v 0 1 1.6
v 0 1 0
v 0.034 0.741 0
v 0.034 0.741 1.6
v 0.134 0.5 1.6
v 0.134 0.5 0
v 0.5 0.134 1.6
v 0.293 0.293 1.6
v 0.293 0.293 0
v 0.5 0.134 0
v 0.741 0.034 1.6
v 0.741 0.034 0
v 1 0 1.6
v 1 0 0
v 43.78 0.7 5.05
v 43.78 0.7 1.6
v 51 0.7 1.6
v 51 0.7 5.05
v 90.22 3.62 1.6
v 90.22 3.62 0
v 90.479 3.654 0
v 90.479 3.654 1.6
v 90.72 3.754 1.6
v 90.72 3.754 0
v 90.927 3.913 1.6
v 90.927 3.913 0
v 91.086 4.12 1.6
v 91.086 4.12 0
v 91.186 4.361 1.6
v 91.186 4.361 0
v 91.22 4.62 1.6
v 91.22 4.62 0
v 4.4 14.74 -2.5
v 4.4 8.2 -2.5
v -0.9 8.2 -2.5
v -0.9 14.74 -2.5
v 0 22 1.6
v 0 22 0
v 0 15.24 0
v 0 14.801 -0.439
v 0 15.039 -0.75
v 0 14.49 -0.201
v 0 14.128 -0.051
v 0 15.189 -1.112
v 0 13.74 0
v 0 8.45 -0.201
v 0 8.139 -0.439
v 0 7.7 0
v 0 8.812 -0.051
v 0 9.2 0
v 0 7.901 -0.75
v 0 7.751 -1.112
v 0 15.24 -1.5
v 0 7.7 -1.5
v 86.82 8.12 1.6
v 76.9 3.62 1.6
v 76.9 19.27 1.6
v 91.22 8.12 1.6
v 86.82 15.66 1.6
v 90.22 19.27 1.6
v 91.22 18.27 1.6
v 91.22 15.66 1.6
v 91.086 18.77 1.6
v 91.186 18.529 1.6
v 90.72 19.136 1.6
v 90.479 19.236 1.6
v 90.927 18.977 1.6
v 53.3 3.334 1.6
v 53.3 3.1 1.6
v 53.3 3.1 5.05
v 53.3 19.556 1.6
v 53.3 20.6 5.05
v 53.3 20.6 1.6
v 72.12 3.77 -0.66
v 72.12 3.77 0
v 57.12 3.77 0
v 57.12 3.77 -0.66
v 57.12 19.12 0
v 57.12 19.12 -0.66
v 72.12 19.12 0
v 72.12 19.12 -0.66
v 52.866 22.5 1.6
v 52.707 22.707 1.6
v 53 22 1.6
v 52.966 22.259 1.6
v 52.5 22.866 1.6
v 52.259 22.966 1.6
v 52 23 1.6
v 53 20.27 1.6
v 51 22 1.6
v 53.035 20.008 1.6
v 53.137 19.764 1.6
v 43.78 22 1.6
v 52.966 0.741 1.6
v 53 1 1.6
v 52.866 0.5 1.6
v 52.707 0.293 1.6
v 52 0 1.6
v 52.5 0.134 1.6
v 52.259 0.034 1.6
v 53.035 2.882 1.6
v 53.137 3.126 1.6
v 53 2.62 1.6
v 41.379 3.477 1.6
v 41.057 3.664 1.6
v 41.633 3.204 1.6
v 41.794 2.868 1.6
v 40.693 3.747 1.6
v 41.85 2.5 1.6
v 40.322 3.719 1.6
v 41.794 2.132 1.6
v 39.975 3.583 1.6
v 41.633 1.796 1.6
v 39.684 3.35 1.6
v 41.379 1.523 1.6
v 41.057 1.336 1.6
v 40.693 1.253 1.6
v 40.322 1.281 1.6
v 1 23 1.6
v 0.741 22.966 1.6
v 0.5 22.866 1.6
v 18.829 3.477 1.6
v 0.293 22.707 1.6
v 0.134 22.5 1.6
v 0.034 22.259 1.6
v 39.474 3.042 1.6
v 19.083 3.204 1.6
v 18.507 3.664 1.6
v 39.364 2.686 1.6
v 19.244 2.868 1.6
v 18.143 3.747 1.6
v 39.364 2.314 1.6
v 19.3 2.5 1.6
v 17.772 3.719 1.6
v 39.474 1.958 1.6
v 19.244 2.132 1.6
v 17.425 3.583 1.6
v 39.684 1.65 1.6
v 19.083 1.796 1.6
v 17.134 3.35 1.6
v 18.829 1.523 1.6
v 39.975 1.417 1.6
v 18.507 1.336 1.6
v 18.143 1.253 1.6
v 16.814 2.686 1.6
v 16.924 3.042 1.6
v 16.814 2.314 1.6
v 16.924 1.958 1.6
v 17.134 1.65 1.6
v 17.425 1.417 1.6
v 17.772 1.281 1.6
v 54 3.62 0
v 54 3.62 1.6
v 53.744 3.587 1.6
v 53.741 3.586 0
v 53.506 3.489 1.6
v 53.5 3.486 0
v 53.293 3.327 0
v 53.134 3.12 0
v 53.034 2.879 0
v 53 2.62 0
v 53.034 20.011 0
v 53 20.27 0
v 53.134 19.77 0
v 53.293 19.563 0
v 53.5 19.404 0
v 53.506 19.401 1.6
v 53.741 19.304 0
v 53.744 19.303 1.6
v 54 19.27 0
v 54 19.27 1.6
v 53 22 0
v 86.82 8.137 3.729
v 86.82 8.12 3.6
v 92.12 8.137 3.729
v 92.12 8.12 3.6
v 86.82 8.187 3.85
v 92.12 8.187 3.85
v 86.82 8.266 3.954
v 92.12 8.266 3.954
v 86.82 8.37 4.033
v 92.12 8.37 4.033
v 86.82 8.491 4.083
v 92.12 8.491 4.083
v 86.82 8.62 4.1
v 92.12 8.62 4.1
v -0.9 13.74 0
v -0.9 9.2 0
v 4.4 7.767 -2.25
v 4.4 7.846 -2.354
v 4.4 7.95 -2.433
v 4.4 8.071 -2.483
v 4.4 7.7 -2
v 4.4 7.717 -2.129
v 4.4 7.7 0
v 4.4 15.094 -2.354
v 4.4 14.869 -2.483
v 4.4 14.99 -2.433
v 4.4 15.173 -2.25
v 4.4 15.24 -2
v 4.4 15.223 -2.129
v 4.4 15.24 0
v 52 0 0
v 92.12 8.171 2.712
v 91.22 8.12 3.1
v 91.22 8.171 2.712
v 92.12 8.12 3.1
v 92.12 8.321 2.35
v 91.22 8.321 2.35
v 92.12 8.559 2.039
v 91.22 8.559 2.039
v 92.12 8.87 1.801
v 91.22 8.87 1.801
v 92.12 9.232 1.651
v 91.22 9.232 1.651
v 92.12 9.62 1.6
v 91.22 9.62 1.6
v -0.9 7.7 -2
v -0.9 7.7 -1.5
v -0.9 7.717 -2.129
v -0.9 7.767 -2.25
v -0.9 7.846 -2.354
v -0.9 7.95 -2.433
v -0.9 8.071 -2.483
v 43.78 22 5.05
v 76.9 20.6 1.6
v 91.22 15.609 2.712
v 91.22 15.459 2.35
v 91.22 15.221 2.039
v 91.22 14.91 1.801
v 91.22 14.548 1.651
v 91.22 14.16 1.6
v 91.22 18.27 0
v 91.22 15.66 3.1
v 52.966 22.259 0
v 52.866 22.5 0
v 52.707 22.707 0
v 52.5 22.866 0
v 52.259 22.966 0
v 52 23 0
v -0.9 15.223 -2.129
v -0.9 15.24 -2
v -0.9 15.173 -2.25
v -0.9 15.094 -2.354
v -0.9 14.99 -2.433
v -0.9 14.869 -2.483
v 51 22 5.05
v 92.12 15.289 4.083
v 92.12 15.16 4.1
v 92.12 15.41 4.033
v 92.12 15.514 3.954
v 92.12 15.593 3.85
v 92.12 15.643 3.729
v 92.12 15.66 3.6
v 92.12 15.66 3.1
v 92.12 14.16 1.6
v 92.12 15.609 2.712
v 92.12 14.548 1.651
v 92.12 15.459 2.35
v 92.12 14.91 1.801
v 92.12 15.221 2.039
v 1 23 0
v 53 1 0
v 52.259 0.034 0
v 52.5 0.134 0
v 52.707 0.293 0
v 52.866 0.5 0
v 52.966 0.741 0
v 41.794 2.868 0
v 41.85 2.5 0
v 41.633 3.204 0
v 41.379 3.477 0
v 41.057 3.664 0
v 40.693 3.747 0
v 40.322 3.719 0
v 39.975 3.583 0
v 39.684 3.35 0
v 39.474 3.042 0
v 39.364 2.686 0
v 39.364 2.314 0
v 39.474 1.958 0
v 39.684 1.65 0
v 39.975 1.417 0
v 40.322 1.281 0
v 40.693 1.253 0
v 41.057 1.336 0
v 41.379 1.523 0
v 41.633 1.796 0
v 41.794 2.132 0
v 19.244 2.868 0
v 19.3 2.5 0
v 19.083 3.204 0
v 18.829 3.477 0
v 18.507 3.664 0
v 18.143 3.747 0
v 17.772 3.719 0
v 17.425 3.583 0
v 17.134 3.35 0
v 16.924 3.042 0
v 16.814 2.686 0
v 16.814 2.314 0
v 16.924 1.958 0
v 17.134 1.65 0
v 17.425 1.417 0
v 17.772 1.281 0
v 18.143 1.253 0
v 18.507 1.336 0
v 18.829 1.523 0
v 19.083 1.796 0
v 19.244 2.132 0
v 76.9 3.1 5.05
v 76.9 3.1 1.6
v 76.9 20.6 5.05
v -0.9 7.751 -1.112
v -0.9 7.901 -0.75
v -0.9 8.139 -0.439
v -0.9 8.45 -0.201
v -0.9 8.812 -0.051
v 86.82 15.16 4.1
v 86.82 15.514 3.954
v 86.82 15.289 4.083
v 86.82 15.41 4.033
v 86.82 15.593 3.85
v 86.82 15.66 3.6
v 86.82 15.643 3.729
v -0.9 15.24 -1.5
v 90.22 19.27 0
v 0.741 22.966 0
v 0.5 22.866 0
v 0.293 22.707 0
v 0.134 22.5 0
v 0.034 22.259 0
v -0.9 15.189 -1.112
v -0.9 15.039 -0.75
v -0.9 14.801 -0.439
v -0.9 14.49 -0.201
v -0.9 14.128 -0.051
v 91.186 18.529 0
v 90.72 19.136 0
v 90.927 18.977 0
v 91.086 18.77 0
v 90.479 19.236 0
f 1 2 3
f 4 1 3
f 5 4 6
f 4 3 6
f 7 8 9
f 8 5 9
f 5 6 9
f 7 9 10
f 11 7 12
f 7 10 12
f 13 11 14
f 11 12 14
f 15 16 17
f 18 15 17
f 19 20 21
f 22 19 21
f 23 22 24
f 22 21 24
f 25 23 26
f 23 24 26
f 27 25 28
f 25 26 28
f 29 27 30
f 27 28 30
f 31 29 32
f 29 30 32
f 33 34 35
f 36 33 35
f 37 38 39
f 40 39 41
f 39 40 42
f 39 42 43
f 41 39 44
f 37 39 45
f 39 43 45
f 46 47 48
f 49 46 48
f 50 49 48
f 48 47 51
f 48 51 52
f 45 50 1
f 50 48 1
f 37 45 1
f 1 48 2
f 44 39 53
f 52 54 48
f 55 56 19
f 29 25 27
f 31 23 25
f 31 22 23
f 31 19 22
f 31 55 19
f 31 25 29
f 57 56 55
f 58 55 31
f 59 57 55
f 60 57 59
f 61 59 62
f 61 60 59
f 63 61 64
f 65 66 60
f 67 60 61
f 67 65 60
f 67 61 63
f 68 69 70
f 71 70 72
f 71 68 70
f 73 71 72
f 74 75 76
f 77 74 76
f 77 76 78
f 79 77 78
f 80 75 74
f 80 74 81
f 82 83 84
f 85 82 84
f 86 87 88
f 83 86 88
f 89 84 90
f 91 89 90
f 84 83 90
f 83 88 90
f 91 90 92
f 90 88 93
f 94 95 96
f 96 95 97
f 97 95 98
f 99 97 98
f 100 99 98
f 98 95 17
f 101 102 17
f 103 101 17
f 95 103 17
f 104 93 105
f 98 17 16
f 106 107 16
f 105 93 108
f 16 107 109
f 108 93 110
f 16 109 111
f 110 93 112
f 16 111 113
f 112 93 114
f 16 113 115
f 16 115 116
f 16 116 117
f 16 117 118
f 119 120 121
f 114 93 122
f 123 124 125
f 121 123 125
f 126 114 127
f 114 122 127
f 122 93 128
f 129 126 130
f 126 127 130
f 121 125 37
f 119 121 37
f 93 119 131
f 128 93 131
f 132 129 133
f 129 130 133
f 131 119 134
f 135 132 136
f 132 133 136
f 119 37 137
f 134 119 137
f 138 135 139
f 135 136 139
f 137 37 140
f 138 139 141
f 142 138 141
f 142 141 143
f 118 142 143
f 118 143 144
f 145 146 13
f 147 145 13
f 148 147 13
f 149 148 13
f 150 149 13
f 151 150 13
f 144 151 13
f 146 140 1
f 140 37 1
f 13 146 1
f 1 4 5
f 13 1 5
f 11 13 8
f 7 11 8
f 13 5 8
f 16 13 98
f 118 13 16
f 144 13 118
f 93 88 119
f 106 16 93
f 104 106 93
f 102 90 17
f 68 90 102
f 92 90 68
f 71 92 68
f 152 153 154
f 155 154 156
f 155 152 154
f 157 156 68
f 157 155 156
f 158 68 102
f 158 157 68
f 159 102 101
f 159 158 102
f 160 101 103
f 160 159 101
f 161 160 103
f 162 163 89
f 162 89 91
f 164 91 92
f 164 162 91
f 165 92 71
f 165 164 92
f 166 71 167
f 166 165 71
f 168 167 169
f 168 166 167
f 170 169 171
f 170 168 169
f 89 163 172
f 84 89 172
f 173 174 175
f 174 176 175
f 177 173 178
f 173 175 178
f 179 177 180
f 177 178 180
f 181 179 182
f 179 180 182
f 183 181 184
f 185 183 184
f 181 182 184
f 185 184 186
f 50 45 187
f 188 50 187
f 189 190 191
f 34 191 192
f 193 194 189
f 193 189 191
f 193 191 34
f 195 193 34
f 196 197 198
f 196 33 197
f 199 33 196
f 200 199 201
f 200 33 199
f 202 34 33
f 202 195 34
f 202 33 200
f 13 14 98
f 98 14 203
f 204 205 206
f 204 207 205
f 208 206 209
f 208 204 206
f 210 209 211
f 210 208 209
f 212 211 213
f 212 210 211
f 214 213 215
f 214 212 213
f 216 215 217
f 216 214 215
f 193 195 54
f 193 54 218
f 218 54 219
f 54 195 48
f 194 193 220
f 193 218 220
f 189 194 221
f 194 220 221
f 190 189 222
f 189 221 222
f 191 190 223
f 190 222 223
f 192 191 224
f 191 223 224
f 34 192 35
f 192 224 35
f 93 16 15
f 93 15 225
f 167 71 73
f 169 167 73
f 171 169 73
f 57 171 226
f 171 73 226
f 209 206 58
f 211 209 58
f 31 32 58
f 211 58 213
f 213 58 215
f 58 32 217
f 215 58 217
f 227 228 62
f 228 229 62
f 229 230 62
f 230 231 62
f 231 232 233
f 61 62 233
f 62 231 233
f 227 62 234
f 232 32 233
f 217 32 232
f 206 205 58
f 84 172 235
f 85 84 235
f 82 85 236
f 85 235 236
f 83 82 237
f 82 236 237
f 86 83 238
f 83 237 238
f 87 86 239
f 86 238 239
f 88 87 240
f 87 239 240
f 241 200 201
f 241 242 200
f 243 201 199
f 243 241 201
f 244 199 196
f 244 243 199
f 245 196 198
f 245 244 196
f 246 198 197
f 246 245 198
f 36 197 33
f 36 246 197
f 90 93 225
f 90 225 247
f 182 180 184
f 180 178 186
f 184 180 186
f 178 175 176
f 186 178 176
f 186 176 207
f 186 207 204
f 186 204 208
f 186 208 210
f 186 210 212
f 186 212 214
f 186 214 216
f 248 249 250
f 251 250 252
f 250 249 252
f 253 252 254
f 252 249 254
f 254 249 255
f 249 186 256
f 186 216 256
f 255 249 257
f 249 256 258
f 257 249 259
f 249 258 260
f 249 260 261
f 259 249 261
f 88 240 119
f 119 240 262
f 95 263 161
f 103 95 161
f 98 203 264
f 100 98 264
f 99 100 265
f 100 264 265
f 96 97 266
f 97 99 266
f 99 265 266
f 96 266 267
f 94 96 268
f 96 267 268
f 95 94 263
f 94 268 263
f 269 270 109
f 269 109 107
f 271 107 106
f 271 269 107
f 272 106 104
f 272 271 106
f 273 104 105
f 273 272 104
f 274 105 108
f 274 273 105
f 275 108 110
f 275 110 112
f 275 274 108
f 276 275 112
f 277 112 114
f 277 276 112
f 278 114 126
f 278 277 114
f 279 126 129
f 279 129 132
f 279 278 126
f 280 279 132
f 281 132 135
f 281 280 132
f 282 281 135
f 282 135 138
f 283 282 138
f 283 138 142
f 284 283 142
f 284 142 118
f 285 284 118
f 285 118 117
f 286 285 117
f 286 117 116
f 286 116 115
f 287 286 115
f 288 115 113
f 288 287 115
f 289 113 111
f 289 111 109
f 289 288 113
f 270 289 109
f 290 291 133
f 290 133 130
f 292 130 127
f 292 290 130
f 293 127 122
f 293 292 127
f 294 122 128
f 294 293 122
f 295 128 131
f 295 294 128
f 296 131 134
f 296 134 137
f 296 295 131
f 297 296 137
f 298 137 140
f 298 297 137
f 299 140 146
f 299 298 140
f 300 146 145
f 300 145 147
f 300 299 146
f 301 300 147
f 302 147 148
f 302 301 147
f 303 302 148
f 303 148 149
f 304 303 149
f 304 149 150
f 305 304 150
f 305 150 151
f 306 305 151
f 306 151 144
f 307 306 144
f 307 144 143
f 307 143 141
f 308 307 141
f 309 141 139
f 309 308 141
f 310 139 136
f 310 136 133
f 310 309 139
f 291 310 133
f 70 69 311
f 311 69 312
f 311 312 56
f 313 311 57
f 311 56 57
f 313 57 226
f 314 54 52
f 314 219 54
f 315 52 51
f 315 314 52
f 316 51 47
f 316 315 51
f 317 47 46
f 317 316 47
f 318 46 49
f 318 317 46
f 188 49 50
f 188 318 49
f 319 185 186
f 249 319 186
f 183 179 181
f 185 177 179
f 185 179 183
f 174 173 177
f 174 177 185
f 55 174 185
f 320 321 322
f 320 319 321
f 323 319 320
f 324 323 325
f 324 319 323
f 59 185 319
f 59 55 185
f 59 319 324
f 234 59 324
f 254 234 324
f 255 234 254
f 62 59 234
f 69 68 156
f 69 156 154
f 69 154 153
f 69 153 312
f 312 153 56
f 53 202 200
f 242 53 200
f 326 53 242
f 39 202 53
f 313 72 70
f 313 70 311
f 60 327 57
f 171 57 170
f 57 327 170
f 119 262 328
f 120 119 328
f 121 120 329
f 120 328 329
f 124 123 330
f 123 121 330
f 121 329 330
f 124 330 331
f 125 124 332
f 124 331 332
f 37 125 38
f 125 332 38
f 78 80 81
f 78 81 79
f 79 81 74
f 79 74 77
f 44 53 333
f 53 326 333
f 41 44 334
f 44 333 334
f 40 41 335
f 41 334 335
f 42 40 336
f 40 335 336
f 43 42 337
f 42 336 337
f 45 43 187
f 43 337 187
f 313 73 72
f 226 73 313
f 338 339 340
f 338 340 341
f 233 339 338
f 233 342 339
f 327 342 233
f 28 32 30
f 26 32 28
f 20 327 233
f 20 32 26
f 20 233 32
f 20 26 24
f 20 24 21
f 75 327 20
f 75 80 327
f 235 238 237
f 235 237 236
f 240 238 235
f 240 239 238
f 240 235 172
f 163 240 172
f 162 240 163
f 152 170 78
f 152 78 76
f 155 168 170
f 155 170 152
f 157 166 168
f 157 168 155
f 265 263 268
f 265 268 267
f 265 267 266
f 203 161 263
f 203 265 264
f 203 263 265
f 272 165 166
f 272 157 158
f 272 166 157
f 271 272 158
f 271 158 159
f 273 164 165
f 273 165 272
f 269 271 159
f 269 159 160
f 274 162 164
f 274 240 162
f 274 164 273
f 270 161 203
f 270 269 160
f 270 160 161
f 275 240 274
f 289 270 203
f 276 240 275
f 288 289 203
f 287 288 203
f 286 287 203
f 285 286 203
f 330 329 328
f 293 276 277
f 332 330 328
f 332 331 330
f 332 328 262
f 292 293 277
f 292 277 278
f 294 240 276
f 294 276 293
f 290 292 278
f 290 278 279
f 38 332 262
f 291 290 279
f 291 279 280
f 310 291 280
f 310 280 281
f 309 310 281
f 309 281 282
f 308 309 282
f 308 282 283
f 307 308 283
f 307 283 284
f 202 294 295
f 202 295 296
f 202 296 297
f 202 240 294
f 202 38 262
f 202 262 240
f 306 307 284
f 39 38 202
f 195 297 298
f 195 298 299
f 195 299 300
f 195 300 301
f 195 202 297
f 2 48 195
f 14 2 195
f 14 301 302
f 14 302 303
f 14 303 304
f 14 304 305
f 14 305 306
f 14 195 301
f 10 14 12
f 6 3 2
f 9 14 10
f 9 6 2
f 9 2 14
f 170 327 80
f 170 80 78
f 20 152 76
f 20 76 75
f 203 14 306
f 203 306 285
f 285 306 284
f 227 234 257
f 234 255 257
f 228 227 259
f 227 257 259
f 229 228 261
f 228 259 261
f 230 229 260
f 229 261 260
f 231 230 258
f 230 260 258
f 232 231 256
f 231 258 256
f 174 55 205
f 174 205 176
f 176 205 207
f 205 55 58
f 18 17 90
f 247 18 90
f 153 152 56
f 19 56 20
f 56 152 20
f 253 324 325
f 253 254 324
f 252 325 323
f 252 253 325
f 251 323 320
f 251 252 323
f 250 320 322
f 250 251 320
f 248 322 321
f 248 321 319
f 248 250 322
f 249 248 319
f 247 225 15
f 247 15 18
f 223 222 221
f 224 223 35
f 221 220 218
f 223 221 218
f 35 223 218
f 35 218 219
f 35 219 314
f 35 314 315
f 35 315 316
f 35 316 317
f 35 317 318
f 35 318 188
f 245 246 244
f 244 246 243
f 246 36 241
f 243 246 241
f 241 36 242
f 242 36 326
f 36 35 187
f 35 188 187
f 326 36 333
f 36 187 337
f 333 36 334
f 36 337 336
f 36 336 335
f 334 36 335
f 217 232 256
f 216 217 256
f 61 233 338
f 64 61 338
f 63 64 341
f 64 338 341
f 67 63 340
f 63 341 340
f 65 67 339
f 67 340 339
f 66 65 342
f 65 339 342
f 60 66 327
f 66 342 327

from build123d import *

# Parameters (mm, degrees)
SKETCH1_R           = 1.25
BOSS_EXTRUDE2_DEPTH = 1.6
SKETCH2_W           = 15
SKETCH2_H           = 15.35
BOSS_EXTRUDE3_DEPTH = 0.66
SKETCH3_W           = 5.3
SKETCH3_H           = 7.54
BOSS_EXTRUDE4_DEPTH = 2.5
FILLET1_R           = 0.5
FILLET2_R           = 1.5
SKETCH4_W           = 5.3
SKETCH4_H           = 7.54
BOSS_EXTRUDE5_DEPTH = 2.5
FILLET3_R           = 0.5
FILLET4_R           = 1.5
SKETCH5_W           = 7.22
SKETCH5_H           = 21.3
SKETCH5_W_2         = 23.6
SKETCH5_H_2         = 17.5
BOSS_EXTRUDE6_DEPTH = 3.45
FILLET5_R           = 1


with BuildPart() as part:
    # Sketch1 → Boss-Extrude2 (new body)
    with BuildSketch(Plane.XY):
        Polygon((0, 0), (53, 0), (53, 3.62), (91.22, 3.62), (91.22, 19.27), (53, 19.27), (53, 23), (0, 23), align=None)
        with Locations((40.6, 2.5)):
            Circle(SKETCH1_R, mode=Mode.SUBTRACT)
        with Locations((18.05, 2.5)):
            Circle(SKETCH1_R, mode=Mode.SUBTRACT)
    extrude(amount=BOSS_EXTRUDE2_DEPTH)

    # Sketch2 → Boss-Extrude3 (add)
    with BuildSketch(Plane(origin=(0, 0, 0), x_dir=(-1, 0, 0), z_dir=(0, 0, -1))):
        with Locations((-64.62, 11.445)):
            Rectangle(SKETCH2_W, SKETCH2_H)
    extrude(amount=BOSS_EXTRUDE3_DEPTH)

    # Sketch3 → Boss-Extrude4 (add)
    with BuildSketch(Plane.XY.offset(1.6)):
        with Locations((89.47, 11.89)):
            Rectangle(SKETCH3_W, SKETCH3_H)
    extrude(amount=BOSS_EXTRUDE4_DEPTH)

    # Fillet1
    fillet1_edges = [part.edges().sort_by_distance(p)[0] for p in [
        (89.47, 15.66, 4.1),
        (89.47, 8.12, 4.1),
    ]]
    fillet(fillet1_edges, radius=FILLET1_R)

    # Fillet2
    fillet2_edges = [part.edges().sort_by_distance(p)[0] for p in [
        (91.67, 15.66, 1.6),
        (91.67, 8.12, 1.6),
    ]]
    fillet(fillet2_edges, radius=FILLET2_R)

    # Sketch4 → Boss-Extrude5 (add)
    with BuildSketch(Plane(origin=(0, 0, 0), x_dir=(-1, 0, 0), z_dir=(0, 0, -1))):
        with Locations((-1.75, 11.47)):
            Rectangle(SKETCH4_W, SKETCH4_H)
    extrude(amount=BOSS_EXTRUDE5_DEPTH)

    # Fillet3
    fillet3_edges = [part.edges().sort_by_distance(p)[0] for p in [
        (1.75, 15.24, -2.5),
        (1.75, 7.7, -2.5),
    ]]
    fillet(fillet3_edges, radius=FILLET3_R)

    # Fillet4
    fillet4_edges = [part.edges().sort_by_distance(p)[0] for p in [
        (-0.45, 15.24, 0),
        (-0.45, 7.7, 0),
    ]]
    fillet(fillet4_edges, radius=FILLET4_R)

    # Sketch5 → Boss-Extrude6 (add)
    with BuildSketch(Plane.XY.offset(1.6)):
        with Locations((47.39, 11.35)):
            Rectangle(SKETCH5_W, SKETCH5_H)
        with Locations((65.1, 11.85)):
            Rectangle(SKETCH5_W_2, SKETCH5_H_2)
    extrude(amount=BOSS_EXTRUDE6_DEPTH)

    # Fillet5
    # the kernel refuses this fillet: 1 mm, written as the material it adds along each edge
    with BuildSketch(Plane(origin=(53, 19.27, 0), x_dir=(0, 1, 0), z_dir=(0, 0, 1)), Plane(origin=(53, 3.62, 0), x_dir=(1, 0, 0), z_dir=(0, 0, 1))) as fillet5_piece_1:
        with BuildLine():
            CenterArc((FILLET5_R, -FILLET5_R), FILLET5_R, 90, 90)
            Line((0, -FILLET5_R), (0, 0))
            Line((0, 0), (FILLET5_R, 0))
        make_face()
    extrude(amount=1.6)
    # the kernel refuses this fillet: 1 mm, written as the material it takes off along each edge
    with BuildSketch(Plane(origin=(0, 23, -2.5), x_dir=(1, 0, 0), z_dir=(0, 0, 1))) as fillet5_2_piece_1:
        with BuildLine():
            CenterArc((FILLET5_R, -FILLET5_R), FILLET5_R, 90, 90)
            Line((0, -FILLET5_R), (0, 0))
            Line((0, 0), (FILLET5_R, 0))
        make_face()
    extrude(amount=6.6, mode=Mode.SUBTRACT)
    with BuildSketch(Plane(origin=(53, 23, -2.5), x_dir=(-1, 0, 0), z_dir=(0, 0, 1)), Plane(origin=(91.22, 19.27, -2.5), x_dir=(-1, 0, 0), z_dir=(0, 0, 1)), Plane(origin=(91.22, 3.62, -2.5), x_dir=(0, 1, 0), z_dir=(0, 0, 1)), Plane(origin=(53, 0, -2.5), x_dir=(0, 1, 0), z_dir=(0, 0, 1)), Plane(origin=(0, 0, -2.5), x_dir=(1, 0, 0), z_dir=(0, 0, 1))) as fillet5_2_piece_2:
        with BuildLine():
            CenterArc((FILLET5_R, FILLET5_R), FILLET5_R, 180, 90)
            Line((0, FILLET5_R), (0, 0))
            Line((0, 0), (FILLET5_R, 0))
        make_face()
    extrude(amount=6.6, mode=Mode.SUBTRACT)


solid = part.part
